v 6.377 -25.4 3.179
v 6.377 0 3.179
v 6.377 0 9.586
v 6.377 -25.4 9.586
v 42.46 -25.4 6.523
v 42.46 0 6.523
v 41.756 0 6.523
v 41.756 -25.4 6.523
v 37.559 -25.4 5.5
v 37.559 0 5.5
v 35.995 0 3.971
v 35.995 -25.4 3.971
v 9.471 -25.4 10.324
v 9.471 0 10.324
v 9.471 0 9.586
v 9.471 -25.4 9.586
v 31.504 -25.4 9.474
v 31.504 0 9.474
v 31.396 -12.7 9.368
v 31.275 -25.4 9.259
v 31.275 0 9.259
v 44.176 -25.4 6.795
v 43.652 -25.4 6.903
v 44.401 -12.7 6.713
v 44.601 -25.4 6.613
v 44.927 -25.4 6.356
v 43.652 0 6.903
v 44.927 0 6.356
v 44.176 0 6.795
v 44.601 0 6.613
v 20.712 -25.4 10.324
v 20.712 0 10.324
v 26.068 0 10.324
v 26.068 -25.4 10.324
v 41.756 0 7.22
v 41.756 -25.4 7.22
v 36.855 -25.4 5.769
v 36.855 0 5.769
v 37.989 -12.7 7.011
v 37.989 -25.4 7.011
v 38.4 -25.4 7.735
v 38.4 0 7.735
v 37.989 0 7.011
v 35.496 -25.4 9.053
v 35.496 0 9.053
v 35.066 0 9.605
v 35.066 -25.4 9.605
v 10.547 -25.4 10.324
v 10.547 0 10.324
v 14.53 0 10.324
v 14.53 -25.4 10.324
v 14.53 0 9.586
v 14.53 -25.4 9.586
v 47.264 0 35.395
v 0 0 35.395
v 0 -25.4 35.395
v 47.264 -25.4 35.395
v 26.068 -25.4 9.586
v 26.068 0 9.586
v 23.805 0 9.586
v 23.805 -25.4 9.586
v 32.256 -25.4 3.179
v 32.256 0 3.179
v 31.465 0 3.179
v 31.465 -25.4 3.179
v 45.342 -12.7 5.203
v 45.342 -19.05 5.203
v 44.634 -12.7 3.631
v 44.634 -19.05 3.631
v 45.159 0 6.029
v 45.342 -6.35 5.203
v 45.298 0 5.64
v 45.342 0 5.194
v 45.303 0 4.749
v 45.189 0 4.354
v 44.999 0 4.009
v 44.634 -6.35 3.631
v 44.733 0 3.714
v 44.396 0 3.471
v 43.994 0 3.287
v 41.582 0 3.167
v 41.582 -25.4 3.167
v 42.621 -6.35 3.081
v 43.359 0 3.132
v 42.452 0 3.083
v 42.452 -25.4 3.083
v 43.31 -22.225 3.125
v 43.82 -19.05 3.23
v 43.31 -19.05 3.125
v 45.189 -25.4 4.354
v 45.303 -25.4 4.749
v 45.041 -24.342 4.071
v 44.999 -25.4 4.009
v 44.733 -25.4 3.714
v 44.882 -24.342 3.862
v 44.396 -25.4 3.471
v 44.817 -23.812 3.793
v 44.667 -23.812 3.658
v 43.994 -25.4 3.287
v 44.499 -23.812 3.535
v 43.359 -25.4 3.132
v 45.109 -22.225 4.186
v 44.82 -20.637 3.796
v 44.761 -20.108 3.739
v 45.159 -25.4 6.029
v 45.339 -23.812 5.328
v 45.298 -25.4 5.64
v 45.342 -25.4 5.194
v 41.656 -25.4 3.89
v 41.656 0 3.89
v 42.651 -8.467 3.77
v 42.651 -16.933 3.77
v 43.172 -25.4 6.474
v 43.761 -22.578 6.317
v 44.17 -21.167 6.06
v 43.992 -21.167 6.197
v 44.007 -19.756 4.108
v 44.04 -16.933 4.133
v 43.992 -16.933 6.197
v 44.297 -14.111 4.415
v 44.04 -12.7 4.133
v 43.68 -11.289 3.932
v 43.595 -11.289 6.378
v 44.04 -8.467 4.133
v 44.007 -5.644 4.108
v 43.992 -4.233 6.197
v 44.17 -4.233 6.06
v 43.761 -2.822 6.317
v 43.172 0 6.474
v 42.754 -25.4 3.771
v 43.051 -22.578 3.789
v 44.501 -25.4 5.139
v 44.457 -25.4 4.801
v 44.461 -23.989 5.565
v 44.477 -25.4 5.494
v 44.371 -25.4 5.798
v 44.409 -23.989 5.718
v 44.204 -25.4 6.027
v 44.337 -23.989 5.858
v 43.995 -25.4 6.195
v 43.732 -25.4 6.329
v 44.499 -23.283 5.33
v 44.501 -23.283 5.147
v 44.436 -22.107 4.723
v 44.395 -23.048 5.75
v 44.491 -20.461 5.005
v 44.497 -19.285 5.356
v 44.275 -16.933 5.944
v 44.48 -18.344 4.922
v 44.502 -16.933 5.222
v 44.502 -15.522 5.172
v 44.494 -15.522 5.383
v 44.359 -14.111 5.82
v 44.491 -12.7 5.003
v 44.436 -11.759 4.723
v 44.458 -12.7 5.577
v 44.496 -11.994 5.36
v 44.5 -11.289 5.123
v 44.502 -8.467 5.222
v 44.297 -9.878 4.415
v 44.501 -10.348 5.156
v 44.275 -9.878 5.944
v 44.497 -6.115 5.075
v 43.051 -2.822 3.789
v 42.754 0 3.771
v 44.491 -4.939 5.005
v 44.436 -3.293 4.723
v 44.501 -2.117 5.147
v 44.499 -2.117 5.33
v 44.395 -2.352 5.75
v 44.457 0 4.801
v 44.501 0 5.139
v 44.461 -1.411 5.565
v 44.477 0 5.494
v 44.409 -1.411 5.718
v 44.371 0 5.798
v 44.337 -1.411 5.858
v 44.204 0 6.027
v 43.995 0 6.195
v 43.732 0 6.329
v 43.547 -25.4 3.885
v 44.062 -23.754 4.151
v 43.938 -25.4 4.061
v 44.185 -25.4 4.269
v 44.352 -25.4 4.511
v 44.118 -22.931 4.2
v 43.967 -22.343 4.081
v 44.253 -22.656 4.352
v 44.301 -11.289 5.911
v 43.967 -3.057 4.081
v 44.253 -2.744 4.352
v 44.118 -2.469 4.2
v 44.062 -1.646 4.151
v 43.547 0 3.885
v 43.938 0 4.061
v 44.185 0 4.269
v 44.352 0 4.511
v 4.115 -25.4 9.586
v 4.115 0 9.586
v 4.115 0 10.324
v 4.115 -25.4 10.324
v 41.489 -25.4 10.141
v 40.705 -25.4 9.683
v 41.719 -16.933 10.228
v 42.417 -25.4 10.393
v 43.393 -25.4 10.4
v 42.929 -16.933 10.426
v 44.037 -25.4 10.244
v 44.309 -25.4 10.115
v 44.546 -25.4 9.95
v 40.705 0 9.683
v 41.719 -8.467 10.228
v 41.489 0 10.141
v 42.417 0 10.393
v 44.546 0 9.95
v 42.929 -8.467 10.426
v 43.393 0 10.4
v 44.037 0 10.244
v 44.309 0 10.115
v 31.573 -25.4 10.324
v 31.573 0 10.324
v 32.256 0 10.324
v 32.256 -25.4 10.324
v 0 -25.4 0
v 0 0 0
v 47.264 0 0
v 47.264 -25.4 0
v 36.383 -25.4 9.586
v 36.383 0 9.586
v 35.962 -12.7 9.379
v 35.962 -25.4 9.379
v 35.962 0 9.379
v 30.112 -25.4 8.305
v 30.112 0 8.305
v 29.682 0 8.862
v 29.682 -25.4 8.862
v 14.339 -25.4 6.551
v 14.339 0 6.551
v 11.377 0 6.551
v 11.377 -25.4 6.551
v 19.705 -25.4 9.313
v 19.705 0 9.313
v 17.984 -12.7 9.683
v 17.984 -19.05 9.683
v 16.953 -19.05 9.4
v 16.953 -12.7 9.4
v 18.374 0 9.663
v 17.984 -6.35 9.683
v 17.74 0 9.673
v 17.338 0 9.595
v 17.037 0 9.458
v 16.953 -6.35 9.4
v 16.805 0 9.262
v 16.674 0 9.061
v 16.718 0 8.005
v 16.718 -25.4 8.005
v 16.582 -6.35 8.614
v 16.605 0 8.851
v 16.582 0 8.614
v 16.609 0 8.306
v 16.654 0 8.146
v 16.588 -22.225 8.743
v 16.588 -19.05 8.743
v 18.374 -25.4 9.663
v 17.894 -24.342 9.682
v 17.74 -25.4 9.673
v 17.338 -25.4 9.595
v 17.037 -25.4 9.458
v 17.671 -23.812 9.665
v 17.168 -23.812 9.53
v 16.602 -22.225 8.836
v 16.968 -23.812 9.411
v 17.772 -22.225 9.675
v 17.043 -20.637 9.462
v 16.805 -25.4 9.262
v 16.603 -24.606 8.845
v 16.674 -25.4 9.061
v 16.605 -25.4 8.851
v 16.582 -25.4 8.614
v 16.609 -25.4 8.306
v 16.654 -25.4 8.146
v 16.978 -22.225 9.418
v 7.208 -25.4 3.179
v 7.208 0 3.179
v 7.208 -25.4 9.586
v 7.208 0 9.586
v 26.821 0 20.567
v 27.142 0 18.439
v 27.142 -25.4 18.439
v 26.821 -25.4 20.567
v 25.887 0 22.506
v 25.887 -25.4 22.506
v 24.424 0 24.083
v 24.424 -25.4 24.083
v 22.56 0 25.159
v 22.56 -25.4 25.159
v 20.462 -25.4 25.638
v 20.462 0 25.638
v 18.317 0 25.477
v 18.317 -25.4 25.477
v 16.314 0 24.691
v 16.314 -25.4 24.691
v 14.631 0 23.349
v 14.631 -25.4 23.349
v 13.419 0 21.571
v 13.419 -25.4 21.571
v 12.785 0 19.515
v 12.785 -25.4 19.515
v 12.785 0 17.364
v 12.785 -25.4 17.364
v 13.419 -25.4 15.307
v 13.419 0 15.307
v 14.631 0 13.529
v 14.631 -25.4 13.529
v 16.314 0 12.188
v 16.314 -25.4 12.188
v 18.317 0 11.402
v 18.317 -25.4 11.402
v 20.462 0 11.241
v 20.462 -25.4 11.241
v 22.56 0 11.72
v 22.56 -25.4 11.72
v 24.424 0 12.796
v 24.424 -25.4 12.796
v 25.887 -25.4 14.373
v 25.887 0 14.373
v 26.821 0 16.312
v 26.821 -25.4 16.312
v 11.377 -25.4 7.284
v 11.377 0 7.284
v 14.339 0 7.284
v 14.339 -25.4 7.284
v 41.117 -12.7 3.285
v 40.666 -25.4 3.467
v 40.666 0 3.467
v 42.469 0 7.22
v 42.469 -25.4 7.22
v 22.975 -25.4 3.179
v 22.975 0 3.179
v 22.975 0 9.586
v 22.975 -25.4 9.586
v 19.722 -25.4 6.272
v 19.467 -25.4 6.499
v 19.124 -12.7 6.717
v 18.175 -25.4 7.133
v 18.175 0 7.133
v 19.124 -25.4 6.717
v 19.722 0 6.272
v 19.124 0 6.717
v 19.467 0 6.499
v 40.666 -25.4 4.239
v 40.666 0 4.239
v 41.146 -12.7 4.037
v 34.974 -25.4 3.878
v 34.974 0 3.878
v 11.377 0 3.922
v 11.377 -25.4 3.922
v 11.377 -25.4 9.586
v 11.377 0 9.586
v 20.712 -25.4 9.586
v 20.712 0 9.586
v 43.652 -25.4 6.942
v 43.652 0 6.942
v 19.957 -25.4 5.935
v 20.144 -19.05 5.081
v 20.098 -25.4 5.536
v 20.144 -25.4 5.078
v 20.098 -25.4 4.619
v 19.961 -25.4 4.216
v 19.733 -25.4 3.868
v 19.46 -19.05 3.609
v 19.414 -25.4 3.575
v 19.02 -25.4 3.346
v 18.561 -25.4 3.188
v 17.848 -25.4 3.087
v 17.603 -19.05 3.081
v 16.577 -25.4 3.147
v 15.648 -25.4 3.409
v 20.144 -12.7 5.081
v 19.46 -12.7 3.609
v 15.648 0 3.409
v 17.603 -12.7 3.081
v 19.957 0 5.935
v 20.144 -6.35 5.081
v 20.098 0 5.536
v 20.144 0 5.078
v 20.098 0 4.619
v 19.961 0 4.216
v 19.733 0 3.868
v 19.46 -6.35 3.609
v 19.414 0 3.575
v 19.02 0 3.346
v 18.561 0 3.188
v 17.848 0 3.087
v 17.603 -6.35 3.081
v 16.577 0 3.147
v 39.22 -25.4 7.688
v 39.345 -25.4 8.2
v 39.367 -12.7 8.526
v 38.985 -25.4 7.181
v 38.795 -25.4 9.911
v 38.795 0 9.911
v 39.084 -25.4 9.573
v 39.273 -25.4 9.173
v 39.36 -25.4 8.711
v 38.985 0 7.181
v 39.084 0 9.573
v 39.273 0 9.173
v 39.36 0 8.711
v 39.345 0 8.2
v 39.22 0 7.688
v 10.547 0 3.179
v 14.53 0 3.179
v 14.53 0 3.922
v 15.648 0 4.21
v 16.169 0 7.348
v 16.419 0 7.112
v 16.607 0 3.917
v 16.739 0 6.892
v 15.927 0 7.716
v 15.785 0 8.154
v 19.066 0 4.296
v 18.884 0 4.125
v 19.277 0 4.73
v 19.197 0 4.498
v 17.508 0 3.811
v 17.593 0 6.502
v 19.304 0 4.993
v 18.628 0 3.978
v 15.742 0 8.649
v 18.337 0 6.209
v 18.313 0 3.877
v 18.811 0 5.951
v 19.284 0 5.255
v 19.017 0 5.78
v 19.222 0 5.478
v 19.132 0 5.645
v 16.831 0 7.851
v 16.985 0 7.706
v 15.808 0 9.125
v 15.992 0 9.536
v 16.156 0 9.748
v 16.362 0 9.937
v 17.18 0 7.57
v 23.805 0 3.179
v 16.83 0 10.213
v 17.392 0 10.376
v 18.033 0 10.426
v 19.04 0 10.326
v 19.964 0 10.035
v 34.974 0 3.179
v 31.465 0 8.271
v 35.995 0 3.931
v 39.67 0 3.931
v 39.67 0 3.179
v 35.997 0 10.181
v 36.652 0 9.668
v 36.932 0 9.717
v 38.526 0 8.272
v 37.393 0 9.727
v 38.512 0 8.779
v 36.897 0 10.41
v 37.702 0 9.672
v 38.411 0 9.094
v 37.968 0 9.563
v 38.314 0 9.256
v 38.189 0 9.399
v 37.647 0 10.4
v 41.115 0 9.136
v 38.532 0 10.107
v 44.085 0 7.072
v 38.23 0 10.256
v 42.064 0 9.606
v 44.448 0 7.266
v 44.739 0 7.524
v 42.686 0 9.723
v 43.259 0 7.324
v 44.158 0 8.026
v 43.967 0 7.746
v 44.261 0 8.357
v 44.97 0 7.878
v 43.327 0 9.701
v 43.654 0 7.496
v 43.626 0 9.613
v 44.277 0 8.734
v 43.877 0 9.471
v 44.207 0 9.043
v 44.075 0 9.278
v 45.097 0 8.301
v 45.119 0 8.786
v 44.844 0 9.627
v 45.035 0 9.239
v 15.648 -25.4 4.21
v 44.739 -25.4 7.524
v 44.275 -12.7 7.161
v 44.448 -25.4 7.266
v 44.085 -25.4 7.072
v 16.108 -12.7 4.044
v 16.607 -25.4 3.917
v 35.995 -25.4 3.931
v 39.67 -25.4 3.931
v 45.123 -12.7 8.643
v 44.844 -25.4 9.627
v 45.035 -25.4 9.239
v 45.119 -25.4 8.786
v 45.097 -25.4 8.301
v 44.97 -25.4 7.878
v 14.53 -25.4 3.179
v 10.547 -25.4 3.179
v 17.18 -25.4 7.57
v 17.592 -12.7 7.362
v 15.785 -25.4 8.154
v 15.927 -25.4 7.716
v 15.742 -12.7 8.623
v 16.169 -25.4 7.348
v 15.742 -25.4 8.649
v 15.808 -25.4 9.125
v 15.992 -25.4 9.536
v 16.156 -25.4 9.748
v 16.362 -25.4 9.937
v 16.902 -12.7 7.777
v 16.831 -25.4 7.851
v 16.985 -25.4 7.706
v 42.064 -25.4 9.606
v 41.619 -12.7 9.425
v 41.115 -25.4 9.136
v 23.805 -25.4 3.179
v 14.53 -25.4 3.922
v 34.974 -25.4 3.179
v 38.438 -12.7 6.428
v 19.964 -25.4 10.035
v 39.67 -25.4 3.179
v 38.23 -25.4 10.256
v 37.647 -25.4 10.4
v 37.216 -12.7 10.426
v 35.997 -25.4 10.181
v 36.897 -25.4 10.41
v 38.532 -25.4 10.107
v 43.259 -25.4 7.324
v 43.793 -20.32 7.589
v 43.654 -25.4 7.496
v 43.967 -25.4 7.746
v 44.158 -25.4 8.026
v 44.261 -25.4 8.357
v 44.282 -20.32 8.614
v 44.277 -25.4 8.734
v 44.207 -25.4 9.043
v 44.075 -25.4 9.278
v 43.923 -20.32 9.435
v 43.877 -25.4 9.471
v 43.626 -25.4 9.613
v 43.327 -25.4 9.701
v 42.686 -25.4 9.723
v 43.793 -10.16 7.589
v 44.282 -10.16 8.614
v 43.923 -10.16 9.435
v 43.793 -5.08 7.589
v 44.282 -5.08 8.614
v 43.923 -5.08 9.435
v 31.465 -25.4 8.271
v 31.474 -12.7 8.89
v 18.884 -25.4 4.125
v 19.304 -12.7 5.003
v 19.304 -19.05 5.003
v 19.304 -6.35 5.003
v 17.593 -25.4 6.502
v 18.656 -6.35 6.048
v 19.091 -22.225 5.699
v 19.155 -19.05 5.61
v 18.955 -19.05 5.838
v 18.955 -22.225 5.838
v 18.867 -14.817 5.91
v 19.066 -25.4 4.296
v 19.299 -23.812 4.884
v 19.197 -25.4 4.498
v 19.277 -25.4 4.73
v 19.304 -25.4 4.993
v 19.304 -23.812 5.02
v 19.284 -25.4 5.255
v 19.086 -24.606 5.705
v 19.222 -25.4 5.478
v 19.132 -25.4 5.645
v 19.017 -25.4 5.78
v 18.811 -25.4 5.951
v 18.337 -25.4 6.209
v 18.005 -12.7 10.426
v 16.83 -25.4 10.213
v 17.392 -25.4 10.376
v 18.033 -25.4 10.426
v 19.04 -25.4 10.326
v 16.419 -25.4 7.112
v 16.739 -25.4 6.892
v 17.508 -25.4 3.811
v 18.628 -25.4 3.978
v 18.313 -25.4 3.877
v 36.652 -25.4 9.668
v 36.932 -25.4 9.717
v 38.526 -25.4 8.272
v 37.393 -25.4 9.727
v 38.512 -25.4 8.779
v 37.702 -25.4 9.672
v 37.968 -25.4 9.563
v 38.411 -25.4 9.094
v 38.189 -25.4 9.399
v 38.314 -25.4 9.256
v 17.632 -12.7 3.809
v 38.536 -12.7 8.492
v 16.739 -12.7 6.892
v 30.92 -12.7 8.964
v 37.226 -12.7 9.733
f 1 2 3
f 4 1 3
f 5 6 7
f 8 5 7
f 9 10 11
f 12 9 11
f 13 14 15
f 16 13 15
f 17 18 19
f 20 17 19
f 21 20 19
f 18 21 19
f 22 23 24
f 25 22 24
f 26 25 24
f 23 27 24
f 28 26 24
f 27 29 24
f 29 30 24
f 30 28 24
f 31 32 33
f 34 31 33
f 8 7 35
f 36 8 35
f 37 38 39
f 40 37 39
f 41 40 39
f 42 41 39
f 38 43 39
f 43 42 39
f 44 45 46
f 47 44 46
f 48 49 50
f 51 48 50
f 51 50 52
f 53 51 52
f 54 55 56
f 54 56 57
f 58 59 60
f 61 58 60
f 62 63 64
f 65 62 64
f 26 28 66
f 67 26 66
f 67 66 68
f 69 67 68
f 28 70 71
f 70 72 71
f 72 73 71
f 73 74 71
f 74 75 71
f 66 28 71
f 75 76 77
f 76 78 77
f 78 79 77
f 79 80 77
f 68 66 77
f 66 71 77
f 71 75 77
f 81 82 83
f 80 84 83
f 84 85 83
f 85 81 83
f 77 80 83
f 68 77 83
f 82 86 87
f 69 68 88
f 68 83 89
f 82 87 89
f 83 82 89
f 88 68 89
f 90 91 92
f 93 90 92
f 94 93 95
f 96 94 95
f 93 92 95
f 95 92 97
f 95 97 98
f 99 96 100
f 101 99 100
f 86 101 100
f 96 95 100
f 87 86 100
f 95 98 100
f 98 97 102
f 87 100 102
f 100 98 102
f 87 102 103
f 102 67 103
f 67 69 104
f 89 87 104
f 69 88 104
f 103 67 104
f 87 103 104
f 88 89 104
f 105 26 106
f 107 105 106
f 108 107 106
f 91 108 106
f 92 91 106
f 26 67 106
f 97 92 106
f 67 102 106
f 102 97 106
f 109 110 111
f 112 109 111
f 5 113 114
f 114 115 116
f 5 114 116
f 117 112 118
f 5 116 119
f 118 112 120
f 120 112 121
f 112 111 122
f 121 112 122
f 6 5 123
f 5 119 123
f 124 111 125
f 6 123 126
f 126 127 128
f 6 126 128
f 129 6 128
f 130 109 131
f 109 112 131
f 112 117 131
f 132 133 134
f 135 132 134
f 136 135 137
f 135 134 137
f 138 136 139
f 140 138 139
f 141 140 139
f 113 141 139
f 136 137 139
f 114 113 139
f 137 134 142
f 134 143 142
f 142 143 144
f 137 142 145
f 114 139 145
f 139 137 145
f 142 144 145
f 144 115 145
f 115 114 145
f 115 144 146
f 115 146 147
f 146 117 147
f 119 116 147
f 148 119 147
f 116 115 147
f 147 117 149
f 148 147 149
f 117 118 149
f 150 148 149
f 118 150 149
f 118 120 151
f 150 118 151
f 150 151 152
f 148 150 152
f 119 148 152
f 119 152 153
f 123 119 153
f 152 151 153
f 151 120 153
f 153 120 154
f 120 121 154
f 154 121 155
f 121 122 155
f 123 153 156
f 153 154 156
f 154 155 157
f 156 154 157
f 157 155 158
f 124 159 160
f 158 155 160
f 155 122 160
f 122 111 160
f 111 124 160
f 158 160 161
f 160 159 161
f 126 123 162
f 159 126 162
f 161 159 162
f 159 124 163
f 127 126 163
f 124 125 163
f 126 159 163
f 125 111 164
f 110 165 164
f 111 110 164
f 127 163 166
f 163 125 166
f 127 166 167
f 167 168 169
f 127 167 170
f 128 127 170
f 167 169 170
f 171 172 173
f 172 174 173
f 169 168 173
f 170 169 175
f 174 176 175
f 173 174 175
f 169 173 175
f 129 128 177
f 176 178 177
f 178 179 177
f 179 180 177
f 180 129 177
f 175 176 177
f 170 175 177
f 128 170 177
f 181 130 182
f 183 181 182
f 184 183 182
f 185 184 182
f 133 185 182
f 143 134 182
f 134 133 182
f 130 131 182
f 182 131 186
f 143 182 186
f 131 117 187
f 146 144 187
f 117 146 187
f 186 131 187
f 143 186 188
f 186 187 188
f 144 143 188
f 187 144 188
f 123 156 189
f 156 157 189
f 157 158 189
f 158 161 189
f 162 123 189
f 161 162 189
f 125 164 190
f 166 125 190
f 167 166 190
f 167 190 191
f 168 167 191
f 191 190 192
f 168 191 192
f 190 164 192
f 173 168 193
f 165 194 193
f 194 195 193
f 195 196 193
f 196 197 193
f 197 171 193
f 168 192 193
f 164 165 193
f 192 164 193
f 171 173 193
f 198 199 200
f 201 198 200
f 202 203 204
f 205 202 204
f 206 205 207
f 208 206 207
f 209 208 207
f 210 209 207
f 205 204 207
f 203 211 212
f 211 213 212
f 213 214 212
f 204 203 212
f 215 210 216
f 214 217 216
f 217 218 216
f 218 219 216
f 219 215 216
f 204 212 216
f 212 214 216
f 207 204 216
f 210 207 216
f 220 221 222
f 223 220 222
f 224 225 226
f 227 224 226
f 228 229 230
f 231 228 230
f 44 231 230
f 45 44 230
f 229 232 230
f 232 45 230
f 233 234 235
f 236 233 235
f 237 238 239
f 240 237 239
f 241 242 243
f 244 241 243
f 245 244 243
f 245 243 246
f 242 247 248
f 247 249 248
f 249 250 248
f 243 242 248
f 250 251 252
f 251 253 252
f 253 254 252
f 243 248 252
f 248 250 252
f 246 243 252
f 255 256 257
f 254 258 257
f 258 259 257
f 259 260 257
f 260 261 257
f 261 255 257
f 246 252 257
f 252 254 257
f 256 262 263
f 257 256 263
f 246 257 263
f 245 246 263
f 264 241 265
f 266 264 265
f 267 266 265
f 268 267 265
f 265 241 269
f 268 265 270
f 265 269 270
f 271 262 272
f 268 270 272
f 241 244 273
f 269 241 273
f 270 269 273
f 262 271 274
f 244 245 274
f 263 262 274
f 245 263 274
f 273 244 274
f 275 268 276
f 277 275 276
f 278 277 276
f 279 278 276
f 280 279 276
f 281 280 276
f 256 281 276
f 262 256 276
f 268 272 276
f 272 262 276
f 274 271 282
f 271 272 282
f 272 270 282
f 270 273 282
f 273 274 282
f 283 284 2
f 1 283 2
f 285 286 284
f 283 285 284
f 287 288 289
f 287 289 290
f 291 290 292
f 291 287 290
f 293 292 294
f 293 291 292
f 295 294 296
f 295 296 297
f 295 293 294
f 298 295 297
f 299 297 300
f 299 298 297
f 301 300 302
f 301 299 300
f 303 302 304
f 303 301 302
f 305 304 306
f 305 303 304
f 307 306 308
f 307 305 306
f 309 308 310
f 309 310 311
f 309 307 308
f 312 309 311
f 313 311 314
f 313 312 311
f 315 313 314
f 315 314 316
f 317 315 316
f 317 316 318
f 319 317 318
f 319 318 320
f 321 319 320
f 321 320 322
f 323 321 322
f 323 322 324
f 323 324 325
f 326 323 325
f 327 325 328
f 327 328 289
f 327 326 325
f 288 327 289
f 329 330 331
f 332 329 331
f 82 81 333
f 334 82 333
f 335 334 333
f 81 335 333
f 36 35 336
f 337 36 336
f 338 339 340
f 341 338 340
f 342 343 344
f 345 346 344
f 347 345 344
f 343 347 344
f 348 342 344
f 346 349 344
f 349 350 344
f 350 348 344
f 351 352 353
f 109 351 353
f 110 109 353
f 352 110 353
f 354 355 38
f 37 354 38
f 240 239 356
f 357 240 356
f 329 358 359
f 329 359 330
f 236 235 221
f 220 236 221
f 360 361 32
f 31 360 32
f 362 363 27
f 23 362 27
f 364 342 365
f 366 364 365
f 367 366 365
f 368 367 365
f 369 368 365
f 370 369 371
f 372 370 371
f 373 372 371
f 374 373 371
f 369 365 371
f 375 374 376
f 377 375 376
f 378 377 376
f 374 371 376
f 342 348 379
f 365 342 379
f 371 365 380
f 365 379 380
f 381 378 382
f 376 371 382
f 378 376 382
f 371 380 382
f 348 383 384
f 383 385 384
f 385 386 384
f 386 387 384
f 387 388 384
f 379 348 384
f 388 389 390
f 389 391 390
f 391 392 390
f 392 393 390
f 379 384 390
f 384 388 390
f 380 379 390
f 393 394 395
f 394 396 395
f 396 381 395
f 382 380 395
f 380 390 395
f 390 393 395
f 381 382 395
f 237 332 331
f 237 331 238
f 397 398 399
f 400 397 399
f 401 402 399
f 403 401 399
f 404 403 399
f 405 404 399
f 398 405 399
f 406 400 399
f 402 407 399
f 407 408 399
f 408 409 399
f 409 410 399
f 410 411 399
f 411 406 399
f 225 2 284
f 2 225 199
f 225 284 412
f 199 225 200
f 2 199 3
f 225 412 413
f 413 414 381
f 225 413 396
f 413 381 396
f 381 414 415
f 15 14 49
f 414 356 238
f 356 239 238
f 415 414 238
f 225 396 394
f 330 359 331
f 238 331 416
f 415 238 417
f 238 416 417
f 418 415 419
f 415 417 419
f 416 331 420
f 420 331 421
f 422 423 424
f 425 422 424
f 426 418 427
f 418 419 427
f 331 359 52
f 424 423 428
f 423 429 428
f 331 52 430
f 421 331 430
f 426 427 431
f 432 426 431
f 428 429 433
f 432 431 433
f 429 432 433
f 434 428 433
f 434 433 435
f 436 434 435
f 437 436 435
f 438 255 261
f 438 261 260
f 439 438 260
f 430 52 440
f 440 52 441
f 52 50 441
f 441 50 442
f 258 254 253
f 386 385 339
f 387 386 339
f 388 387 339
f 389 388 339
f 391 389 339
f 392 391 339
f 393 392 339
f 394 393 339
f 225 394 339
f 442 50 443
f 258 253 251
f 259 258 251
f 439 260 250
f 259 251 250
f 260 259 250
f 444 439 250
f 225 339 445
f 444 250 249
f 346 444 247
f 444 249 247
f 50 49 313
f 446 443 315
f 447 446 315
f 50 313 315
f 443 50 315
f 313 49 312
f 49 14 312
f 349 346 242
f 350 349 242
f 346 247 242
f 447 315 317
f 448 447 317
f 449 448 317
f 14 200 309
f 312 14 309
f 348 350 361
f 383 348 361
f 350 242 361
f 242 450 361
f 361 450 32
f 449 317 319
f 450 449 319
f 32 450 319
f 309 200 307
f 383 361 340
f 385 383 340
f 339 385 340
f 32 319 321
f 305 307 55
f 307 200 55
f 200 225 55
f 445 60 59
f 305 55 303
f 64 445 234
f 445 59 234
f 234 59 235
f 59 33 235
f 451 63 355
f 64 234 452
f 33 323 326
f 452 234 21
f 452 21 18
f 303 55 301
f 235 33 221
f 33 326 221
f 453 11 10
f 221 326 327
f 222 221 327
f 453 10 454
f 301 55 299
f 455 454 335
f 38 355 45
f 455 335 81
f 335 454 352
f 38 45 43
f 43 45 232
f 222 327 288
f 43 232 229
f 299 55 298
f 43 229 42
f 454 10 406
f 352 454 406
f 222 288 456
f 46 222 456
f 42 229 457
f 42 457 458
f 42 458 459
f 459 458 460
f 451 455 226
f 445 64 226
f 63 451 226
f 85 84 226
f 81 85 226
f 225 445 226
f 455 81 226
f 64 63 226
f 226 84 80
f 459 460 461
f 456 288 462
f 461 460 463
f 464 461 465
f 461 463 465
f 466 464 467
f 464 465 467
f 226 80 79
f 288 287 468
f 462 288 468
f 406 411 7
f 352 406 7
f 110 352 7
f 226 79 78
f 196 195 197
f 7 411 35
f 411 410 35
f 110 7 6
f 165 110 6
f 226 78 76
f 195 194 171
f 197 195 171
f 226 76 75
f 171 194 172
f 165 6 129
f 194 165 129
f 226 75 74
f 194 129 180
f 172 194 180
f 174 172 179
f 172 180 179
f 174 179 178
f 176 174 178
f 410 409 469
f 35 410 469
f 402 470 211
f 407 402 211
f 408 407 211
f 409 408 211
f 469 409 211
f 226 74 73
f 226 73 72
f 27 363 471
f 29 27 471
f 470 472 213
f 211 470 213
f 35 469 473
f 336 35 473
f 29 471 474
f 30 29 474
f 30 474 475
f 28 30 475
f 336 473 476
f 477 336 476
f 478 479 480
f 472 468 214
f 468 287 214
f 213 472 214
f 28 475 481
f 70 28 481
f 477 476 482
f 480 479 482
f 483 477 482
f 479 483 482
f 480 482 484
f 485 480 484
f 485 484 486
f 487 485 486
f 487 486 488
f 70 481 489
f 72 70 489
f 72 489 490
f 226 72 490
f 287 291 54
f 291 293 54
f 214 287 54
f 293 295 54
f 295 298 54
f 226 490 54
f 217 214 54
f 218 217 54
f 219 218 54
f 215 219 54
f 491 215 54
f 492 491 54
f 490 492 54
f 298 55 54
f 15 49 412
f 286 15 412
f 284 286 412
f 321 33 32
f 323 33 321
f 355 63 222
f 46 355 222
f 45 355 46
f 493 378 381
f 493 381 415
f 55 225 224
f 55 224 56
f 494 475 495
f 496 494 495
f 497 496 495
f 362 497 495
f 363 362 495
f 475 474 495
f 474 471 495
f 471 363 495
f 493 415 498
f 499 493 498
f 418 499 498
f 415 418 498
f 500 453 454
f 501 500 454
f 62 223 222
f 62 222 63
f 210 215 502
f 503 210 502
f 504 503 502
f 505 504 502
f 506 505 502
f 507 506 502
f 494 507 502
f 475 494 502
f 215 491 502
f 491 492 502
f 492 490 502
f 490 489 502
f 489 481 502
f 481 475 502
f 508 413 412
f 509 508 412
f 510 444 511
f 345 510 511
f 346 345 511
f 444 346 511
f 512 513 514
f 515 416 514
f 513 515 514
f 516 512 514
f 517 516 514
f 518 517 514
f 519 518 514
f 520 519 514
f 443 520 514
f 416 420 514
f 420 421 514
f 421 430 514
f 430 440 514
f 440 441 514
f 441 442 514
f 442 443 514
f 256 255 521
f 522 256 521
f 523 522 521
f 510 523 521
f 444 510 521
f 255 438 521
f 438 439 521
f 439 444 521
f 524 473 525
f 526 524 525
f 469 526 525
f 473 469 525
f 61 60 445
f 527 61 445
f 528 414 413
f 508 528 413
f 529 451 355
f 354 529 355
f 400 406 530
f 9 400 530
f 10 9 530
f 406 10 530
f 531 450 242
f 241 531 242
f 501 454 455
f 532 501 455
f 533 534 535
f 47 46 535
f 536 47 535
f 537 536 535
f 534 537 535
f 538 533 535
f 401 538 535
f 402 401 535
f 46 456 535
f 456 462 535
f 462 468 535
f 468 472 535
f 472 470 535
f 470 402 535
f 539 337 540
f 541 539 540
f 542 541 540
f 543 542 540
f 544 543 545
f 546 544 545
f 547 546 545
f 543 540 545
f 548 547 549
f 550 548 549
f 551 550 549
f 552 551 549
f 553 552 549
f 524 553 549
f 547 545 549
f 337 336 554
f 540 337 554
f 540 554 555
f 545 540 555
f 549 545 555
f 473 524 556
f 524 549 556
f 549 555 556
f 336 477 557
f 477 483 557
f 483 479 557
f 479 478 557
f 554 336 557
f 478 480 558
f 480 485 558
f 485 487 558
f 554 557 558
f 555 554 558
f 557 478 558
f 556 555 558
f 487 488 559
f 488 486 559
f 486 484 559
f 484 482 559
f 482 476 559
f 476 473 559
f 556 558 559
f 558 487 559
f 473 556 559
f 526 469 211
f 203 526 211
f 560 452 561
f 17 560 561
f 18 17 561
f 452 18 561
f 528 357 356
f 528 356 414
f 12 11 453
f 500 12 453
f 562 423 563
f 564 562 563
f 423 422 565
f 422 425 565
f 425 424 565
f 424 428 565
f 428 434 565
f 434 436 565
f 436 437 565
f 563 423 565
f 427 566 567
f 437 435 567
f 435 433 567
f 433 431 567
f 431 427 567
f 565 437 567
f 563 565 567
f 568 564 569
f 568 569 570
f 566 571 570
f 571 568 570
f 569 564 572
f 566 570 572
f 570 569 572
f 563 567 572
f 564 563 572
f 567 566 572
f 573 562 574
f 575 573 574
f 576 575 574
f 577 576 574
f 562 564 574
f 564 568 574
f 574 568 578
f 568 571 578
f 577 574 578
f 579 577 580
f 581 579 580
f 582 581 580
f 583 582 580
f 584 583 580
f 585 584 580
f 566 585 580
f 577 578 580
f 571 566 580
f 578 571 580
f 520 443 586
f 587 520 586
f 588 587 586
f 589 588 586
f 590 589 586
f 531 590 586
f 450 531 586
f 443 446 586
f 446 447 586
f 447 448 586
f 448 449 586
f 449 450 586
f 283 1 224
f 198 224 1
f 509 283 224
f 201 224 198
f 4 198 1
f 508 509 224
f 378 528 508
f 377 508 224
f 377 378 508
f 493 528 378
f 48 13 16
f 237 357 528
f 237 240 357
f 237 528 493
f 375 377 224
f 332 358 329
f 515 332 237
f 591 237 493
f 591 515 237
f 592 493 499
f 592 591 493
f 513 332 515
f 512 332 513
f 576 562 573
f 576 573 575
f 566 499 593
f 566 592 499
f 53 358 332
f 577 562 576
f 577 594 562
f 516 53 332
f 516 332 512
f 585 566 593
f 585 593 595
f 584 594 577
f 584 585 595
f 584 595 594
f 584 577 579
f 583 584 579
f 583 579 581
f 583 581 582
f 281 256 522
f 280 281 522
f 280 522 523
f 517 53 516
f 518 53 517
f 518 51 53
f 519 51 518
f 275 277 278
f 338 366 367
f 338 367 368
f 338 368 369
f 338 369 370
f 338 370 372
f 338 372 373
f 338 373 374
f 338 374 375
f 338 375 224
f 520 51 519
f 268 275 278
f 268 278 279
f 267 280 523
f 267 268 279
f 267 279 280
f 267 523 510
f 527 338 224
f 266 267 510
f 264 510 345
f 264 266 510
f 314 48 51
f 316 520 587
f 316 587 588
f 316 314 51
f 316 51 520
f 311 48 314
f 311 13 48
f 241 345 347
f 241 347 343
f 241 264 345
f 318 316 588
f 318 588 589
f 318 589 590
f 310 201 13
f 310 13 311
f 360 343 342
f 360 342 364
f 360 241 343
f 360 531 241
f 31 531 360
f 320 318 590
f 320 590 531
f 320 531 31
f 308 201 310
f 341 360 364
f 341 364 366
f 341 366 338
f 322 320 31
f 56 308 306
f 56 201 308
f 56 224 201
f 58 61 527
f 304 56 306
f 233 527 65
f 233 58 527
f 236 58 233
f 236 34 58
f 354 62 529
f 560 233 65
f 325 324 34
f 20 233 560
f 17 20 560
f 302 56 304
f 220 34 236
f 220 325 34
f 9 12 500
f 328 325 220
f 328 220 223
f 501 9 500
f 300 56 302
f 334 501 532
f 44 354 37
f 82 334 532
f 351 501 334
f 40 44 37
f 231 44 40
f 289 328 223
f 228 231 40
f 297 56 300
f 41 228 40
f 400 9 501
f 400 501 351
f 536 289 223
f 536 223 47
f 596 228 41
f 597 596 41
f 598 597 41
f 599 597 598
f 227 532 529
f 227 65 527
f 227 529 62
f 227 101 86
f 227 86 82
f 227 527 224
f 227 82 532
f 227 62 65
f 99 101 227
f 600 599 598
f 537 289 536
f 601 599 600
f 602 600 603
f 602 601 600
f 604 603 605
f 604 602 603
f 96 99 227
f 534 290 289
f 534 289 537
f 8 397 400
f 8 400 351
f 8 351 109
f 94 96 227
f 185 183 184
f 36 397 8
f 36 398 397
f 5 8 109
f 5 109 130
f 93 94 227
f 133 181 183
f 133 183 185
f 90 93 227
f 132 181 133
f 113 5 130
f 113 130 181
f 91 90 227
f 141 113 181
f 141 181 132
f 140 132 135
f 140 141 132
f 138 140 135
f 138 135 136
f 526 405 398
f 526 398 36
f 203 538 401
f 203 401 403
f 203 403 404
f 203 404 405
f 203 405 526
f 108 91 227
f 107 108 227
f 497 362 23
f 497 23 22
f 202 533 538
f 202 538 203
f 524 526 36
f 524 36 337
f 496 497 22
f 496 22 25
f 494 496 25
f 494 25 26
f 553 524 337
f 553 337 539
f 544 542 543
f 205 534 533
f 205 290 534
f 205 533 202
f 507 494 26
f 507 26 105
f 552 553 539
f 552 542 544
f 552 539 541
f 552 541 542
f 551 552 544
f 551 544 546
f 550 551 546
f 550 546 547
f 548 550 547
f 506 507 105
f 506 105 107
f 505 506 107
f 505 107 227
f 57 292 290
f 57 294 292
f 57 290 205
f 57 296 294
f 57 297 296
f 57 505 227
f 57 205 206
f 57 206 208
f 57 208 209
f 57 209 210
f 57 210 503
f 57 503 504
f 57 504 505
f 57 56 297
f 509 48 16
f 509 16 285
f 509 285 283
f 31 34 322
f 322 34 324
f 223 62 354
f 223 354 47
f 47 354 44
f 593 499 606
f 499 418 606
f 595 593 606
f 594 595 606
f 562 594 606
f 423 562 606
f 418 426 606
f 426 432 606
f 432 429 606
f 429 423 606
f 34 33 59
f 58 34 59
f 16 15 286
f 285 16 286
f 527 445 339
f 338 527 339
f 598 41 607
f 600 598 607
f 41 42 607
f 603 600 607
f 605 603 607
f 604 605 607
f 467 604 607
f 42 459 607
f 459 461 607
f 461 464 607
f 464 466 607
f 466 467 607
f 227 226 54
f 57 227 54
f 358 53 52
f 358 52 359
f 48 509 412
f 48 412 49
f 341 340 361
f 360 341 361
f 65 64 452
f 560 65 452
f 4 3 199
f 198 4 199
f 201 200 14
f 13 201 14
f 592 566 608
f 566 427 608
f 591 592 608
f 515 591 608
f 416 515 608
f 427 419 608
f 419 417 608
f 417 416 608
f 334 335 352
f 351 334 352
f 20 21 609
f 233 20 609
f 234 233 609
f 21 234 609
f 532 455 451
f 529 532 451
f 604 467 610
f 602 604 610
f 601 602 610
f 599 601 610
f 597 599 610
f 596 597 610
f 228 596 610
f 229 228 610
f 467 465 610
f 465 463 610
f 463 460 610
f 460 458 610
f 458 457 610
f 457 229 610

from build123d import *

# Parameters (mm, degrees)
F0_W     = 47.2641885281
F0_H     = 35.3951528668
F0_R     = 7.2186571731
F1_DEPTH = 25.4


with BuildPart() as f1:
    # F0 (on Front) → F1 (new body)
    with BuildSketch(Plane.XZ):
        with Locations((23.632094264, 17.6975764334)):
            Rectangle(F0_W, F0_H)
        Polygon((7.2078548692, 9.5862786071), (7.2078548692, 3.1792055815), (6.3774531664, 3.1792055815), (6.3774531664, 9.5862786071), (4.11456943, 9.5862786071), (4.11456943, 10.324413454), (9.4707386056, 10.324413454), (9.4707386056, 9.5862786071), align=None, mode=Mode.SUBTRACT)
        Polygon((14.5297772283, 3.9220319636), (14.5297772283, 3.1792055815), (10.5466639757, 3.1792055815), (10.5466639757, 10.324413454), (14.5297772283, 10.324413454), (14.5297772283, 9.5862786071), (11.3770656786, 9.5862786071), (11.3770656786, 7.2842987453), (14.3389881365, 7.2842987453), (14.3389881365, 6.5508554334), (11.3770656786, 6.5508554334), (11.3770656786, 3.9220319636), align=None, mode=Mode.SUBTRACT)
        with BuildLine():
            add(Edge.make_bspline(
                [(19.7217426774, 6.2724910208), (20.1439808314, 5.8127205864), (20.1439808314, 5.0808411195)],
                knots=[0, 0, 0, 1, 1, 1], degree=2))
            add(Edge.make_bspline(
                [(20.1439808314, 5.0808411195), (20.1439808314, 4.1378425756), (19.4597986374, 3.6092629606)],
                knots=[0, 0, 0, 1, 1, 1], degree=2))
            add(Edge.make_bspline(
                [(19.4597986374, 3.6092629606), (18.7756164434, 3.0806833456), (17.6027326824, 3.0806833456)],
                knots=[0, 0, 0, 1, 1, 1], degree=2))
            add(Edge.make_bspline(
                [(17.6027326824, 3.0806833456), (16.3328905304, 3.0806833456), (15.6479264139, 3.4090907987)],
                knots=[0, 0, 0, 1, 1, 1], degree=2))
            Line((15.6479264139, 3.4090907987), (15.6479264139, 4.2097794463))
            add(Edge.make_bspline(
                [(15.6479264139, 4.2097794463), (16.0889307081, 4.0252457345), (16.606563408, 3.9173404285)],
                knots=[0, 0, 0, 1, 1, 1], degree=2))
            add(Edge.make_bspline(
                [(16.606563408, 3.9173404285), (17.1241961078, 3.8094351225), (17.6324457376, 3.8094351225)],
                knots=[0, 0, 0, 1, 1, 1], degree=2))
            add(Edge.make_bspline(
                [(17.6324457376, 3.8094351225), (18.4628474405, 3.8094351225), (18.8835217495, 4.124549893)],
                knots=[0, 0, 0, 1, 1, 1], degree=2))
            add(Edge.make_bspline(
                [(18.8835217495, 4.124549893), (19.3041960584, 4.4396646634), (19.3041960584, 5.0026488688)],
                knots=[0, 0, 0, 1, 1, 1], degree=2))
            add(Edge.make_bspline(
                [(19.3041960584, 5.0026488688), (19.3041960584, 5.3732801373), (19.1548488595, 5.610202657)],
                knots=[0, 0, 0, 1, 1, 1], degree=2))
            add(Edge.make_bspline(
                [(19.1548488595, 5.610202657), (19.0055016606, 5.8471251767), (18.6559822998, 6.0480792611)],
                knots=[0, 0, 0, 1, 1, 1], degree=2))
            add(Edge.make_bspline(
                [(18.6559822998, 6.0480792611), (18.306462939, 6.2490333455), (17.5933496123, 6.5023762379)],
                knots=[0, 0, 0, 1, 1, 1], degree=2))
            add(Edge.make_bspline(
                [(17.5933496123, 6.5023762379), (16.5971803379, 6.8589329013), (16.1694687263, 7.3476344684)],
                knots=[0, 0, 0, 1, 1, 1], degree=2))
            add(Edge.make_bspline(
                [(16.1694687263, 7.3476344684), (15.7417571148, 7.8363360355), (15.7417571148, 8.622950078)],
                knots=[0, 0, 0, 1, 1, 1], degree=2))
            add(Edge.make_bspline(
                [(15.7417571148, 8.622950078), (15.7417571148, 9.4486602458), (16.3618216631, 9.9373618129)],
                knots=[0, 0, 0, 1, 1, 1], degree=2))
            add(Edge.make_bspline(
                [(16.3618216631, 9.9373618129), (16.9818862115, 10.42606338), (18.0046408512, 10.42606338)],
                knots=[0, 0, 0, 1, 1, 1], degree=2))
            add(Edge.make_bspline(
                [(18.0046408512, 10.42606338), (19.0696193062, 10.42606338), (19.9641386547, 10.0351021263)],
                knots=[0, 0, 0, 1, 1, 1], degree=2))
            Line((19.9641386547, 10.0351021263), (19.7045403822, 9.3126057295))
            add(Edge.make_bspline(
                [(19.7045403822, 9.3126057295), (18.8194041039, 9.683236998), (17.984310866, 9.683236998)],
                knots=[0, 0, 0, 1, 1, 1], degree=2))
            add(Edge.make_bspline(
                [(17.984310866, 9.683236998), (17.3243682697, 9.683236998), (16.9529550787, 9.4001810503)],
                knots=[0, 0, 0, 1, 1, 1], degree=2))
            add(Edge.make_bspline(
                [(16.9529550787, 9.4001810503), (16.5815418877, 9.1171251026), (16.5815418877, 8.6135670079)],
                knots=[0, 0, 0, 1, 1, 1], degree=2))
            add(Edge.make_bspline(
                [(16.5815418877, 8.6135670079), (16.5815418877, 8.2429357394), (16.7183783265, 8.0052312971)],
                knots=[0, 0, 0, 1, 1, 1], degree=2))
            add(Edge.make_bspline(
                [(16.7183783265, 8.0052312971), (16.8552147653, 7.7675268549), (17.1804945284, 7.5697004605)],
                knots=[0, 0, 0, 1, 1, 1], degree=2))
            add(Edge.make_bspline(
                [(17.1804945284, 7.5697004605), (17.5057742914, 7.3718740661), (18.1750999578, 7.1326057789)],
                knots=[0, 0, 0, 1, 1, 1], degree=2))
            add(Edge.make_bspline(
                [(18.1750999578, 7.1326057789), (19.2995045234, 6.7322614551), (19.7217426774, 6.2724910208)],
                knots=[0, 0, 0, 1, 1, 1], degree=2))
        make_face(mode=Mode.SUBTRACT)
        Polygon((23.8049420109, 9.5862786071), (23.8049420109, 3.1792055815), (22.9745403081, 3.1792055815), (22.9745403081, 9.5862786071), (20.7116565717, 9.5862786071), (20.7116565717, 10.324413454), (26.0678257473, 10.324413454), (26.0678257473, 9.5862786071), align=None, mode=Mode.SUBTRACT)
        with BuildLine():
            Line((32.2559604707, 10.324413454), (32.2559604707, 3.1792055815))
            Line((32.2559604707, 3.1792055815), (31.4646548933, 3.1792055815))
            Line((31.4646548933, 3.1792055815), (31.4646548933, 8.2710849496))
            add(Edge.make_bspline(
                [(31.4646548933, 8.2710849496), (31.4646548933, 8.9075698706), (31.5037510186, 9.473681766)],
                knots=[0, 0, 0, 1, 1, 1], degree=2))
            add(Edge.make_bspline(
                [(31.5037510186, 9.473681766), (31.4021010927, 9.370467995), (31.274647724, 9.2586530765)],
                knots=[0, 0, 0, 1, 1, 1], degree=2))
            add(Edge.make_bspline(
                [(31.274647724, 9.2586530765), (31.1471943553, 9.1468381579), (30.1119289555, 8.30548954)],
                knots=[0, 0, 0, 1, 1, 1], degree=2))
            Line((30.1119289555, 8.30548954), (29.6818715764, 8.8622183652))
            Line((29.6818715764, 8.8622183652), (31.5725601993, 10.324413454))
            Line((31.5725601993, 10.324413454), (32.2559604707, 10.324413454))
        make_face(mode=Mode.SUBTRACT)
        with BuildLine():
            Line((39.6701496858, 3.9314150336), (39.6701496858, 3.1792055815))
            Line((39.6701496858, 3.1792055815), (34.9739231064, 3.1792055815))
            Line((34.9739231064, 3.1792055815), (34.9739231064, 3.8782443031))
            Line((34.9739231064, 3.8782443031), (36.8552286592, 5.768932926))
            add(Edge.make_bspline(
                [(36.8552286592, 5.768932926), (37.7153434173, 6.6399945992), (37.9890162949, 7.0114077902)],
                knots=[0, 0, 0, 1, 1, 1], degree=2))
            add(Edge.make_bspline(
                [(37.9890162949, 7.0114077902), (38.2626891725, 7.3828209812), (38.3995256113, 7.7346861096)],
                knots=[0, 0, 0, 1, 1, 1], degree=2))
            add(Edge.make_bspline(
                [(38.3995256113, 7.7346861096), (38.5363620501, 8.0865512379), (38.5363620501, 8.4915870967)],
                knots=[0, 0, 0, 1, 1, 1], degree=2))
            add(Edge.make_bspline(
                [(38.5363620501, 8.4915870967), (38.5363620501, 9.0639543721), (38.1891884568, 9.3986172053)],
                knots=[0, 0, 0, 1, 1, 1], degree=2))
            add(Edge.make_bspline(
                [(38.1891884568, 9.3986172053), (37.8420148635, 9.7332800384), (37.2258599277, 9.7332800384)],
                knots=[0, 0, 0, 1, 1, 1], degree=2))
            add(Edge.make_bspline(
                [(37.2258599277, 9.7332800384), (36.7817279435, 9.7332800384), (36.3829474647, 9.5862786071)],
                knots=[0, 0, 0, 1, 1, 1], degree=2))
            add(Edge.make_bspline(
                [(36.3829474647, 9.5862786071), (35.984166986, 9.4392771757), (35.4962473413, 9.053007457)],
                knots=[0, 0, 0, 1, 1, 1], degree=2))
            Line((35.4962473413, 9.053007457), (35.0661899623, 9.6050447472))
            add(Edge.make_bspline(
                [(35.0661899623, 9.6050447472), (36.0529761666, 10.42606338), (37.2164768576, 10.42606338)],
                knots=[0, 0, 0, 1, 1, 1], degree=2))
            add(Edge.make_bspline(
                [(37.2164768576, 10.42606338), (38.2235930471, 10.42606338), (38.7951784, 9.9107764476)],
                knots=[0, 0, 0, 1, 1, 1], degree=2))
            add(Edge.make_bspline(
                [(38.7951784, 9.9107764476), (39.3667637529, 9.3954895153), (39.3667637529, 8.525991687)],
                knots=[0, 0, 0, 1, 1, 1], degree=2))
            add(Edge.make_bspline(
                [(39.3667637529, 8.525991687), (39.3667637529, 7.8457191056), (38.9851855693, 7.1810849743)],
                knots=[0, 0, 0, 1, 1, 1], degree=2))
            add(Edge.make_bspline(
                [(38.9851855693, 7.1810849743), (38.6036073857, 6.5164508431), (37.5589589158, 5.4999515835)],
                knots=[0, 0, 0, 1, 1, 1], degree=2))
            Line((37.5589589158, 5.4999515835), (35.9951139011, 3.970511159))
            Line((35.9951139011, 3.970511159), (35.9951139011, 3.9314150336))
            Line((35.9951139011, 3.9314150336), (39.6701496858, 3.9314150336))
        make_face(mode=Mode.SUBTRACT)
        with BuildLine():
            add(Edge.make_bspline(
                [(44.5462184418, 9.949872573), (45.1232772523, 9.473681766), (45.1232772523, 8.6432800631)],
                knots=[0, 0, 0, 1, 1, 1], degree=2))
            add(Edge.make_bspline(
                [(45.1232772523, 8.6432800631), (45.1232772523, 7.9583159467), (44.7393533011, 7.5235670326)],
                knots=[0, 0, 0, 1, 1, 1], degree=2))
            add(Edge.make_bspline(
                [(44.7393533011, 7.5235670326), (44.35542935, 7.0888181185), (43.6516990934, 6.9418166871)],
                knots=[0, 0, 0, 1, 1, 1], degree=2))
            Line((43.6516990934, 6.9418166871), (43.6516990934, 6.9027205617))
            add(Edge.make_bspline(
                [(43.6516990934, 6.9027205617), (44.5118138515, 6.7963791007), (44.9270147029, 6.356156729)],
                knots=[0, 0, 0, 1, 1, 1], degree=2))
            add(Edge.make_bspline(
                [(44.9270147029, 6.356156729), (45.3422155543, 5.9159343574), (45.3422155543, 5.2028210307)],
                knots=[0, 0, 0, 1, 1, 1], degree=2))
            add(Edge.make_bspline(
                [(45.3422155543, 5.2028210307), (45.3422155543, 4.181630236), (44.6337937626, 3.6311567908)],
                knots=[0, 0, 0, 1, 1, 1], degree=2))
            add(Edge.make_bspline(
                [(44.6337937626, 3.6311567908), (43.9253719709, 3.0806833456), (42.6211252286, 3.0806833456)],
                knots=[0, 0, 0, 1, 1, 1], degree=2))
            add(Edge.make_bspline(
                [(42.6211252286, 3.0806833456), (42.0534494883, 3.0806833456), (41.5819502163, 3.1666948214)],
                knots=[0, 0, 0, 1, 1, 1], degree=2))
            add(Edge.make_bspline(
                [(41.5819502163, 3.1666948214), (41.1104509444, 3.2527062972), (40.6663189602, 3.4669530643)],
                knots=[0, 0, 0, 1, 1, 1], degree=2))
            Line((40.6663189602, 3.4669530643), (40.6663189602, 4.2394925016))
            add(Edge.make_bspline(
                [(40.6663189602, 4.2394925016), (41.1307809296, 4.0096072844), (41.6562328545, 3.8899731408)],
                knots=[0, 0, 0, 1, 1, 1], degree=2))
            add(Edge.make_bspline(
                [(41.6562328545, 3.8899731408), (42.1816847795, 3.7703389971), (42.6508382839, 3.7703389971)],
                knots=[0, 0, 0, 1, 1, 1], degree=2))
            add(Edge.make_bspline(
                [(42.6508382839, 3.7703389971), (44.5024307814, 3.7703389971), (44.5024307814, 5.2215871708)],
                knots=[0, 0, 0, 1, 1, 1], degree=2))
            add(Edge.make_bspline(
                [(44.5024307814, 5.2215871708), (44.5024307814, 6.5227062231), (42.4600491921, 6.5227062231)],
                knots=[0, 0, 0, 1, 1, 1], degree=2))
            Line((42.4600491921, 6.5227062231), (41.7563189355, 6.5227062231))
            Line((41.7563189355, 6.5227062231), (41.7563189355, 7.2201810997))
            Line((41.7563189355, 7.2201810997), (42.4694322622, 7.2201810997))
            add(Edge.make_bspline(
                [(42.4694322622, 7.2201810997), (43.3045255001, 7.2201810997), (43.7932270672, 7.5892485232)],
                knots=[0, 0, 0, 1, 1, 1], degree=2))
            add(Edge.make_bspline(
                [(43.7932270672, 7.5892485232), (44.2819286343, 7.9583159467), (44.2819286343, 8.6135670079)],
                knots=[0, 0, 0, 1, 1, 1], degree=2))
            add(Edge.make_bspline(
                [(44.2819286343, 8.6135670079), (44.2819286343, 9.1358912428), (43.9230262034, 9.4345856406)],
                knots=[0, 0, 0, 1, 1, 1], degree=2))
            add(Edge.make_bspline(
                [(43.9230262034, 9.4345856406), (43.5641237725, 9.7332800384), (42.9479688367, 9.7332800384)],
                knots=[0, 0, 0, 1, 1, 1], degree=2))
            add(Edge.make_bspline(
                [(42.9479688367, 9.7332800384), (42.4788153323, 9.7332800384), (42.0636144809, 9.6058266697)],
                knots=[0, 0, 0, 1, 1, 1], degree=2))
            add(Edge.make_bspline(
                [(42.0636144809, 9.6058266697), (41.6484136294, 9.478373301), (41.1151424794, 9.1358912428)],
                knots=[0, 0, 0, 1, 1, 1], degree=2))
            Line((41.1151424794, 9.1358912428), (40.7054150855, 9.683236998))
            add(Edge.make_bspline(
                [(40.7054150855, 9.683236998), (41.1448555347, 10.0304105912), (41.7187866551, 10.2282369856)],
                knots=[0, 0, 0, 1, 1, 1], degree=2))
            add(Edge.make_bspline(
                [(41.7187866551, 10.2282369856), (42.2927177755, 10.42606338), (42.9292026965, 10.42606338)],
                knots=[0, 0, 0, 1, 1, 1], degree=2))
            add(Edge.make_bspline(
                [(42.9292026965, 10.42606338), (43.9691596314, 10.42606338), (44.5462184418, 9.949872573)],
                knots=[0, 0, 0, 1, 1, 1], degree=2))
        make_face(mode=Mode.SUBTRACT)
        with Locations((19.9230182916, 18.4393916279)):
            Circle(F0_R, mode=Mode.SUBTRACT)
    extrude(amount=F1_DEPTH)


solid = f1.part
